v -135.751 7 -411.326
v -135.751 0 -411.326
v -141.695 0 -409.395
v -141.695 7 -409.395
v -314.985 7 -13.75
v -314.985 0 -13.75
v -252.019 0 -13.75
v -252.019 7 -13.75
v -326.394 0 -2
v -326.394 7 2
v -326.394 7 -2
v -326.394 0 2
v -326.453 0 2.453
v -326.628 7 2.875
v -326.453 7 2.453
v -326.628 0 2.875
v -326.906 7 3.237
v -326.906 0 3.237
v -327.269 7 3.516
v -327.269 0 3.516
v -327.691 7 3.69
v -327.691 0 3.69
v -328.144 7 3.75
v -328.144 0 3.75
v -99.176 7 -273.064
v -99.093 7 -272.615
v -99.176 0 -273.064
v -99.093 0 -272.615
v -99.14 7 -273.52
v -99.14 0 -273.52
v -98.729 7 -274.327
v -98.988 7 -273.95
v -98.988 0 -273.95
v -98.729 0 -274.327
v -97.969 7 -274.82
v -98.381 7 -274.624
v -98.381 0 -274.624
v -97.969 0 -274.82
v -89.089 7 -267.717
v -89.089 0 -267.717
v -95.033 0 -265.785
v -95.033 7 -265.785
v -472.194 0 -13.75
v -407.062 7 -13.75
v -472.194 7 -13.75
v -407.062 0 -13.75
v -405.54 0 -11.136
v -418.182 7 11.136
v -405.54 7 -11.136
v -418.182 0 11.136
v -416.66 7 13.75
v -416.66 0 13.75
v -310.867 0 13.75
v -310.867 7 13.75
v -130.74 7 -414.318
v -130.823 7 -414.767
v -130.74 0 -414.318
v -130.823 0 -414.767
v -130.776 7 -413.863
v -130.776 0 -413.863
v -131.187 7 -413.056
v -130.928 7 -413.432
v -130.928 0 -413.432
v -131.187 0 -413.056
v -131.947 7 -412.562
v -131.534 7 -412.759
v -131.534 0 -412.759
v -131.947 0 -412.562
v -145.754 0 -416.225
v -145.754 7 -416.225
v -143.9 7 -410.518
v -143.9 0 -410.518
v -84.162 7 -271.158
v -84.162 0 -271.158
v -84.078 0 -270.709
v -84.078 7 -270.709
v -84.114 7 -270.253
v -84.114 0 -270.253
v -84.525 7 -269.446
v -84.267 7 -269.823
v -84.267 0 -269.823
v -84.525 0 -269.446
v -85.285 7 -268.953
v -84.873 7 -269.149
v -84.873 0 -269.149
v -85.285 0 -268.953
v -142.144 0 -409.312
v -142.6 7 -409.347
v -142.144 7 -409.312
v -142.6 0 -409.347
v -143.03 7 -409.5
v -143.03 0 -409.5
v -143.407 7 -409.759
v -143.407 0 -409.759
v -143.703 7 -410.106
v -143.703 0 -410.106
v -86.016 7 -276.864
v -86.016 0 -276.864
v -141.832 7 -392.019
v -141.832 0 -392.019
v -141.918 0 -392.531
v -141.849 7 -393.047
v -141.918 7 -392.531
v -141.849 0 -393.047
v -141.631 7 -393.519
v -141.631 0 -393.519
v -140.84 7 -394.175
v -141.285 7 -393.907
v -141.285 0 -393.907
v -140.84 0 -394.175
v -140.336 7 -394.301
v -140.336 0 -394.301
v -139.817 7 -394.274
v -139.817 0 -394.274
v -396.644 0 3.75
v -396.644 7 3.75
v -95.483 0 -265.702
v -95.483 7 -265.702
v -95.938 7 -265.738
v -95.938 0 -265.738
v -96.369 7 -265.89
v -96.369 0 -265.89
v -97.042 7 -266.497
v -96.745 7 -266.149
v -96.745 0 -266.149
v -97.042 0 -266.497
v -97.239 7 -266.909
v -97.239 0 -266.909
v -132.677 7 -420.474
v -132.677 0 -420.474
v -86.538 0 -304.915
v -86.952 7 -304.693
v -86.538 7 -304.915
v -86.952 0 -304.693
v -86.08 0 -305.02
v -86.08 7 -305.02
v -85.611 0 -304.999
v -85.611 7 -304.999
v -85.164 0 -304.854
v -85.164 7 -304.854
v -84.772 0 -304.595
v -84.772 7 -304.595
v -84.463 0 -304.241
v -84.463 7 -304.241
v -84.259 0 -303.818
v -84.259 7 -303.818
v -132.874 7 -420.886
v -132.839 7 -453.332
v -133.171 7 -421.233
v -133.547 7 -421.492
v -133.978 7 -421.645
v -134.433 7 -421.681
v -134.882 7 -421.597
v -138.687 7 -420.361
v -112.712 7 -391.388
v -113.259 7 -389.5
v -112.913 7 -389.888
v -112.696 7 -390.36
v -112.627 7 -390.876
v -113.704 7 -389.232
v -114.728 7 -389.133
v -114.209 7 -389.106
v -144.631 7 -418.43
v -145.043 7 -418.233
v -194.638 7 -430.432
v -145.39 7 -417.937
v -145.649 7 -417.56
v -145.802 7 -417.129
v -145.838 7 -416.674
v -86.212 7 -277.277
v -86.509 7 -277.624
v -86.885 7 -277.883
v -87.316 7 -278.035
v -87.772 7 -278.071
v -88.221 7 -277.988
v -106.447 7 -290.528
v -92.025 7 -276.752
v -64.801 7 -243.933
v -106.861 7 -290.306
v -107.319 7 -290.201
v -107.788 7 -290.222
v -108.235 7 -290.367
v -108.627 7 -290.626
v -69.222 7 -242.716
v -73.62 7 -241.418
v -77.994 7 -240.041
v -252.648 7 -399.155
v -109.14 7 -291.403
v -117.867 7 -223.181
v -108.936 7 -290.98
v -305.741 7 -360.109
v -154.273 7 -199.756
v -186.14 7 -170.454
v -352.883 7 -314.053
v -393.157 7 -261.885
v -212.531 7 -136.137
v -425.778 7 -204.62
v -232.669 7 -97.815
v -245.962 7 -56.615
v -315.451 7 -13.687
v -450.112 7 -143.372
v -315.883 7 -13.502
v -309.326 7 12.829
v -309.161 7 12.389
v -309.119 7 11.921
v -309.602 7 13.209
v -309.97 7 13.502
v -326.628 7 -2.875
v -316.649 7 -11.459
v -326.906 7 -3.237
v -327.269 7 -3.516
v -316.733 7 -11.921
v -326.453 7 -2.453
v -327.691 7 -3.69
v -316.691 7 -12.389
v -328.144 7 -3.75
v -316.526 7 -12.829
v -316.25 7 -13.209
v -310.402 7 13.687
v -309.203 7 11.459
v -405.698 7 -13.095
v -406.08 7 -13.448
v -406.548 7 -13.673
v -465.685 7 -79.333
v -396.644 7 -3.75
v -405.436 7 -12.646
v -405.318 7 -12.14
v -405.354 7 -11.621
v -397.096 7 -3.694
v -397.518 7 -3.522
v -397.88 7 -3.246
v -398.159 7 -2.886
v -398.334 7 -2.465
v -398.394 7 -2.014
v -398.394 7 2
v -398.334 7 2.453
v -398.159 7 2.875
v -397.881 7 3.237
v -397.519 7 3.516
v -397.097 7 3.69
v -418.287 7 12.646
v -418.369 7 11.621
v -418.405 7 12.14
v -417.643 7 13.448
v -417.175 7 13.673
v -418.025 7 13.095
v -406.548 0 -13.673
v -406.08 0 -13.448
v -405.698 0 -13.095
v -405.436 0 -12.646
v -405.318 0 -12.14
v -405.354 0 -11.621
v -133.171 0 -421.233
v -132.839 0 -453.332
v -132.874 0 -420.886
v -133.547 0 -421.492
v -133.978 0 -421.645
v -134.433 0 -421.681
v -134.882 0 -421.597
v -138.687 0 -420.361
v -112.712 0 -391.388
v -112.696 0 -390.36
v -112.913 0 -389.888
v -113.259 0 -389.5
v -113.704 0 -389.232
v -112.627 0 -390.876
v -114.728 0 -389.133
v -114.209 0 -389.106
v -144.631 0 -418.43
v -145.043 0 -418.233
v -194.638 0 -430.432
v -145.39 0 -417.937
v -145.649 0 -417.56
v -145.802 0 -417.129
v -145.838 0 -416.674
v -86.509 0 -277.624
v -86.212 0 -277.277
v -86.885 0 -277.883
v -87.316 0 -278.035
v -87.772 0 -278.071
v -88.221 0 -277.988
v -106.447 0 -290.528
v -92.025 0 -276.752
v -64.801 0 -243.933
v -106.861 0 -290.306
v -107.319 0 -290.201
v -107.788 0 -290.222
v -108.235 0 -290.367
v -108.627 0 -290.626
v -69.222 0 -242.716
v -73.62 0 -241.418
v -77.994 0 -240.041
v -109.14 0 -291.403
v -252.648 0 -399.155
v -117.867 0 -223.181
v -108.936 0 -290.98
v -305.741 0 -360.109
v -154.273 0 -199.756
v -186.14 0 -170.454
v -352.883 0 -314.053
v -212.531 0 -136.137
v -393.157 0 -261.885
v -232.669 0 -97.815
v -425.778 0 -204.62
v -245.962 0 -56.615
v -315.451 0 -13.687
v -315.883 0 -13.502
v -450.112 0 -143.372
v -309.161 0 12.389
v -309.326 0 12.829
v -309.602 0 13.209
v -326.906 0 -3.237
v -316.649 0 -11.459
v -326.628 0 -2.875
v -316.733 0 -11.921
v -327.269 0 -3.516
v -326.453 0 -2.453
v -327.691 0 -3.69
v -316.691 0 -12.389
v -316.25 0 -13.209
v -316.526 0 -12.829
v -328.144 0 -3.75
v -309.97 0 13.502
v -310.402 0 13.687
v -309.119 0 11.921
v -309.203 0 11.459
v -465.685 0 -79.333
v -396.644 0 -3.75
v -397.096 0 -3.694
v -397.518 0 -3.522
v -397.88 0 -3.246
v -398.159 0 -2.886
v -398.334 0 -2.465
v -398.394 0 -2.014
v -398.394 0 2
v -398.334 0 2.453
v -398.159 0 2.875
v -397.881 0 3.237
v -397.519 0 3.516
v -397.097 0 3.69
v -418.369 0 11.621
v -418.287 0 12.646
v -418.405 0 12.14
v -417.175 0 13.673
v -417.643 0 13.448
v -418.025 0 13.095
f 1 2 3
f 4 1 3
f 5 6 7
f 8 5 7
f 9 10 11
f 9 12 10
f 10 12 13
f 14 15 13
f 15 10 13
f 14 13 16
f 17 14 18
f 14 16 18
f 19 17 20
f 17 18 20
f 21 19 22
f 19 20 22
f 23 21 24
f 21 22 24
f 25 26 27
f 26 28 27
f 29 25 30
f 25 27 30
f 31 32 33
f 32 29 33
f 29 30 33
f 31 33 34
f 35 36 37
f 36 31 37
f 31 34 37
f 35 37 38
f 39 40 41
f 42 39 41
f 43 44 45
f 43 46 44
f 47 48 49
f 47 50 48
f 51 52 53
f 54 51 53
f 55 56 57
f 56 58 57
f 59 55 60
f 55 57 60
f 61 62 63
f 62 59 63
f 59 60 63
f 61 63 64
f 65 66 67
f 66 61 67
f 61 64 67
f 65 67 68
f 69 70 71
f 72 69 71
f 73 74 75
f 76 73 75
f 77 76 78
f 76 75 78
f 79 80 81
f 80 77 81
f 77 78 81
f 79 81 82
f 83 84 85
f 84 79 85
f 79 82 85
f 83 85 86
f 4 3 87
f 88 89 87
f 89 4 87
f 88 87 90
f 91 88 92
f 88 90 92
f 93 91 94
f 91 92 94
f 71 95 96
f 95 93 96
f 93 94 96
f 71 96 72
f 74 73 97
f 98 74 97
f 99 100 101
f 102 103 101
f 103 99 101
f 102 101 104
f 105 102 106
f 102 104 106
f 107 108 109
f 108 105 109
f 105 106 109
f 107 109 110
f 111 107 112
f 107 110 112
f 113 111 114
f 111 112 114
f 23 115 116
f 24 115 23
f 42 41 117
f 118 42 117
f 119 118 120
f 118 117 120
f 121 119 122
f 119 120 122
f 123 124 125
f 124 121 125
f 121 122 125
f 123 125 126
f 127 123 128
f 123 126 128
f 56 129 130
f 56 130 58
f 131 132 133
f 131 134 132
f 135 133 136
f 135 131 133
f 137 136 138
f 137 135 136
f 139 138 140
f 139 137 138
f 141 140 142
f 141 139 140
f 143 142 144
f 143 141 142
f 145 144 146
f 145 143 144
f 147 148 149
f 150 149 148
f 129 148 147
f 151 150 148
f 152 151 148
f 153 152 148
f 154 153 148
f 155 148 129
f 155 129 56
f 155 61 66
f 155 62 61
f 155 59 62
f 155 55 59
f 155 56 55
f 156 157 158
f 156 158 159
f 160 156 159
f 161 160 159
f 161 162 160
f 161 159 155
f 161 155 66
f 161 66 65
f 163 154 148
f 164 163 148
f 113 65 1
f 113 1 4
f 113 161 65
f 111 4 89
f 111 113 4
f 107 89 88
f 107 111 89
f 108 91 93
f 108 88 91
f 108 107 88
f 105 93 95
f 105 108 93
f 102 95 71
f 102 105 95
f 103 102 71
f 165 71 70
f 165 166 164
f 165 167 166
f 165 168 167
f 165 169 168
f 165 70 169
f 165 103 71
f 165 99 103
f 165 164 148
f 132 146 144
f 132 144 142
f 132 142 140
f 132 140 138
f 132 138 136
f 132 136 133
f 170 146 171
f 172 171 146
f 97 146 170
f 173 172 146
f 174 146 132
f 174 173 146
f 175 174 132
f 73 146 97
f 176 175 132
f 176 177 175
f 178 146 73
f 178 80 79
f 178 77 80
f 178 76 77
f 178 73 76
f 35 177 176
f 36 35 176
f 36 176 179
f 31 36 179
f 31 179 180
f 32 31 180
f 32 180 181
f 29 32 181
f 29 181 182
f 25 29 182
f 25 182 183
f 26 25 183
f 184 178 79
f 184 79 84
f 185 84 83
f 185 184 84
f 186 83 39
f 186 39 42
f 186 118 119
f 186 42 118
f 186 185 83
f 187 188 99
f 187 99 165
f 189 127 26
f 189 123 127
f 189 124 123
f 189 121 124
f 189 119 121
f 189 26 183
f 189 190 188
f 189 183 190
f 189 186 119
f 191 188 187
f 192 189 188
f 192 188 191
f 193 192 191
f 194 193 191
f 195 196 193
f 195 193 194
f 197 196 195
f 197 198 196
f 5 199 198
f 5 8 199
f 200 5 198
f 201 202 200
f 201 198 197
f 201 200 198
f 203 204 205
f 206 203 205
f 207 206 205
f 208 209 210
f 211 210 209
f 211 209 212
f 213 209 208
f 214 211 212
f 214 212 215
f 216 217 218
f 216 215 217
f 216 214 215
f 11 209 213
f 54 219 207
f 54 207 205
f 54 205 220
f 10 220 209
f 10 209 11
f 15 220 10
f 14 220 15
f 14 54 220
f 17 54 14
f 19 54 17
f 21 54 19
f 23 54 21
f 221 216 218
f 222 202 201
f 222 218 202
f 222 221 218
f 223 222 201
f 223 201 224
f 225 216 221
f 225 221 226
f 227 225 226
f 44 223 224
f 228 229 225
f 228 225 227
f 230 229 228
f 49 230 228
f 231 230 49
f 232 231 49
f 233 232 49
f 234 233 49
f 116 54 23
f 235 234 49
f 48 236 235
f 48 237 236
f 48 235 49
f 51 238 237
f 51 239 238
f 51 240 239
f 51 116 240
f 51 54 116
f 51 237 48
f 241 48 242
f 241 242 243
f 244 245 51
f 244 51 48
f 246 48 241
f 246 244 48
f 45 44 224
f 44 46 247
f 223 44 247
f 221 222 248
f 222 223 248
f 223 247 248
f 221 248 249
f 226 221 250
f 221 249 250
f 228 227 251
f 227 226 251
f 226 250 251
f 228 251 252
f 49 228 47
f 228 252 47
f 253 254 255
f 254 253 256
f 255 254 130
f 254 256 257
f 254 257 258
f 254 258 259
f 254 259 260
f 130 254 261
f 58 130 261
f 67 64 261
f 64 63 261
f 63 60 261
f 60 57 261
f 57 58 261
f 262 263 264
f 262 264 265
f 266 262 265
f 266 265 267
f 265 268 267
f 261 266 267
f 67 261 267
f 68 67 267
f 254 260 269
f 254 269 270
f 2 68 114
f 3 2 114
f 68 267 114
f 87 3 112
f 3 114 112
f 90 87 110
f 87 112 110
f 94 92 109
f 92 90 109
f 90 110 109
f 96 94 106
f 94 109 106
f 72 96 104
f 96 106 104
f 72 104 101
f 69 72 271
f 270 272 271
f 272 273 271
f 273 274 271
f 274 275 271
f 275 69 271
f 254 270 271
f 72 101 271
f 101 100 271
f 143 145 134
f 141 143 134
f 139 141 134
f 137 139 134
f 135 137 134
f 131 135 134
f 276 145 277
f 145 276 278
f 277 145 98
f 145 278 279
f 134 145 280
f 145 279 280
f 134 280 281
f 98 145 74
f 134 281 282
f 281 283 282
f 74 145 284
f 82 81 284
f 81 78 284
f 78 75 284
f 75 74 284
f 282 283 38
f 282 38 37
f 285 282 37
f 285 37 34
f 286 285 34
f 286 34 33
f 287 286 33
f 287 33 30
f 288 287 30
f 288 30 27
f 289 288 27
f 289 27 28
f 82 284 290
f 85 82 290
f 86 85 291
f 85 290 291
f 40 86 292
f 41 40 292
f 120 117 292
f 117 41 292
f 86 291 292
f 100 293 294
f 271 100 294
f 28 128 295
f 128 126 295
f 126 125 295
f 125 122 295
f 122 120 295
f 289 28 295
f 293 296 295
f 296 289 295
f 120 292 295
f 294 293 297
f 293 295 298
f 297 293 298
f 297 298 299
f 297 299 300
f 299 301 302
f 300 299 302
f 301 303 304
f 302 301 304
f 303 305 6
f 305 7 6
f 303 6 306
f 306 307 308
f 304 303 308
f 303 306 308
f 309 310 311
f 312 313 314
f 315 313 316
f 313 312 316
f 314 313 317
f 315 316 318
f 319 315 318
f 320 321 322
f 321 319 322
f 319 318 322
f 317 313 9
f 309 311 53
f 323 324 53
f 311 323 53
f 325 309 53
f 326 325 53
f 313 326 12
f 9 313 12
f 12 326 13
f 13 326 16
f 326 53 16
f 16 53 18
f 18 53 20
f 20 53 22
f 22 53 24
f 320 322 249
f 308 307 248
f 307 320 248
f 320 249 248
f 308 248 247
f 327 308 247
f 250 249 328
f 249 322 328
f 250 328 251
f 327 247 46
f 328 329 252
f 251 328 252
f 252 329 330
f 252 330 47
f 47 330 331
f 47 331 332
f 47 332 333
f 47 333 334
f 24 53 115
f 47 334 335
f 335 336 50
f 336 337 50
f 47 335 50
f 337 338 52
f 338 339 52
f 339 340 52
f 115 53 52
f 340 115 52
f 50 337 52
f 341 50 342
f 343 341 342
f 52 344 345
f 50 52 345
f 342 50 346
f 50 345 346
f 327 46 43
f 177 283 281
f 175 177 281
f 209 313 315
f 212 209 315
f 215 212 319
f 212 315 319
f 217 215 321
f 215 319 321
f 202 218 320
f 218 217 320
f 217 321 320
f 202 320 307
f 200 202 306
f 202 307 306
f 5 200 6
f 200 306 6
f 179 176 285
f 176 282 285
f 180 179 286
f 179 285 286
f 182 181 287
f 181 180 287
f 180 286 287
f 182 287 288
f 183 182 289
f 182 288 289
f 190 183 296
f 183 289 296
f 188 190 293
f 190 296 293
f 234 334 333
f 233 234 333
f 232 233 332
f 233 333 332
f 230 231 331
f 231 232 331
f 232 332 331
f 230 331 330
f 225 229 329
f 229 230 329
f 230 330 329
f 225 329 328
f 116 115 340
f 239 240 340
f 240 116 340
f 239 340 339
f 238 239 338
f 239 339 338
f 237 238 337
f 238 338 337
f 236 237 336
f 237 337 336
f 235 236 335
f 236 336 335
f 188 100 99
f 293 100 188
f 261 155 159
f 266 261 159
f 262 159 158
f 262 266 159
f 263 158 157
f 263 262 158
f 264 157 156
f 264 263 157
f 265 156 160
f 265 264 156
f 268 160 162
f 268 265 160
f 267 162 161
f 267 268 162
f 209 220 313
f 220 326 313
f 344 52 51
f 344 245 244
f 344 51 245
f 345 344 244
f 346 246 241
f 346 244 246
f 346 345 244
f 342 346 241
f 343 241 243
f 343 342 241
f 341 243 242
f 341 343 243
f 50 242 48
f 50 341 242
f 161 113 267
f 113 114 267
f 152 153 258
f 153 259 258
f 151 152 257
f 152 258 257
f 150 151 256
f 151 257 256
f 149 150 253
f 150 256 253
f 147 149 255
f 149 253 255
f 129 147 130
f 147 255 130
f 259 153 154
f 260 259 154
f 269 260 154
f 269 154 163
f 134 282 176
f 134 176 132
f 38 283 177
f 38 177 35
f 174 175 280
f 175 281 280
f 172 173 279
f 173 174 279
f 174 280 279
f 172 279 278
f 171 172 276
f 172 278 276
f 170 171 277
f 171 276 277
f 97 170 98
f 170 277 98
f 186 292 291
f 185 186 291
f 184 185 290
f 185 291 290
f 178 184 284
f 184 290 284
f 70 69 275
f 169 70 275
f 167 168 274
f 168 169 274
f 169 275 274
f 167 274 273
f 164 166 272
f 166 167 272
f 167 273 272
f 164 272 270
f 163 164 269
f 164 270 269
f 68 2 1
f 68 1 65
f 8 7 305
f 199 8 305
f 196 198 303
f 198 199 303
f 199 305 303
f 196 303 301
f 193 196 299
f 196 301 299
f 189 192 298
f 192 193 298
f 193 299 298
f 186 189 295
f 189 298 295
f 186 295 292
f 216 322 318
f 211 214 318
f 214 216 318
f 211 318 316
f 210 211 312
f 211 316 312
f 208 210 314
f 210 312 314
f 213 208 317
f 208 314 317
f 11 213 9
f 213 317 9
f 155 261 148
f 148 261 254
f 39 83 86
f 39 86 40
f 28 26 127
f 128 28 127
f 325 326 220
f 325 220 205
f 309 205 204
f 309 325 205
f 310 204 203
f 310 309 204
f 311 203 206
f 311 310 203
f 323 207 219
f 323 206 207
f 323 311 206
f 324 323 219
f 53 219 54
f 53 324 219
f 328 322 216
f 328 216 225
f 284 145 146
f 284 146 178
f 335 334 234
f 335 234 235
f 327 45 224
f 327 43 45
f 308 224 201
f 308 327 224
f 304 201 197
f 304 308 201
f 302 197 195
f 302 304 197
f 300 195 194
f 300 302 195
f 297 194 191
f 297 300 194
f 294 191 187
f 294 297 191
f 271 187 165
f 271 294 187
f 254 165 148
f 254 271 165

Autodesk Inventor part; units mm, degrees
ref_plane "YZ Plane" through (0, 0, 0) normal (1, 0, 0) x (0, 1, 0)
ref_plane "XZ Plane" through (0, 0, 0) normal (0, 1, 0) x (-1, 0, 0)
ref_plane "XY Plane" through (0, 0, 0) normal (0, 0, 1) x (1, 0, 0)
sketch "Sketch1" plane through (0, 0, 0) normal (0, 1, 0) x (-1, 0, 0)
  line L0 (0, 0) -> (618.9442, 0)
  line L1 (0, 0) -> (191.2643, 588.6509)
  line L2 (0, 0) -> (-500.7364, 363.8063)
  line L3 (0, 0) -> (-500.7364, -363.8063)
  line L4 (0, 0) -> (191.2643, -588.6509)
  line L5 (396.6438, 3.75) -> (328.1438, 3.75)
  line L6 (328.1438, -3.75) -> (396.6438, -3.75)
  arc A0 (472.3938, 0) -> (145.9777, 449.2732) centre (0, 0) ccw
  arc A1 (77.994, -240.0408) -> (252.3938, 0) centre (0, 0) ccw
  line L7 (289.8938, 3.75) -> (283.8938, 3.75)
  line L8 (283.8938, -3.75) -> (289.8938, -3.75)
  arc A2 (328.1438, 3.75) -> (326.3938, 2) centre (328.1438, 2) ccw
  arc A3 (326.3938, -2) -> (328.1438, -3.75) centre (328.1438, -2) ccw
  line L9 (326.3938, 2) -> (326.3938, -2)
  arc A4 (398.3938, 2) -> (396.6438, 3.75) centre (396.6438, 2) ccw
  arc A5 (396.6438, -3.75) -> (398.3938, -2.0136) centre (396.6573, -2.0136) ccw
  line L10 (398.3938, -2.0136) -> (398.3938, 2)
  line L11 (362.3938, -3.75) -> (362.3938, 32.9806)
  arc A6 (283.8938, 3.75) -> (282.1438, 2) centre (283.8938, 2) ccw
  arc A7 (282.1438, -2) -> (283.8938, -3.75) centre (283.8938, -2) ccw
  arc A8 (289.8938, -3.75) -> (291.6438, -2) centre (289.8938, -2) ccw
  arc A9 (291.6438, 2) -> (289.8938, 3.75) centre (289.8938, 2) ccw
  line L12 (291.6438, 2) -> (291.6438, -2)
  line L13 (282.1438, -2) -> (282.1438, 2)
  line L14 (434.8938, 3.75) -> (440.8938, 3.75)
  line L15 (440.8938, -3.75) -> (434.8938, -3.75)
  arc A10 (442.6438, 2) -> (440.8938, 3.75) centre (440.8938, 2) ccw
  arc A11 (440.8938, -3.75) -> (442.6438, -2) centre (440.8938, -2) ccw
  arc A12 (433.1438, -2) -> (434.8938, -3.75) centre (434.8938, -2) ccw
  arc A13 (434.8938, 3.75) -> (433.1438, 2) centre (434.8938, 2) ccw
  line L16 (433.1438, 2) -> (433.1438, -2)
  line L17 (442.6438, -2) -> (442.6438, 2)
  line L18 (131.9467, 412.5623) -> (135.7509, 411.3262)
  arc A14 (130.8231, 414.7674) -> (131.9467, 412.5623) centre (132.4875, 414.2266) ccw
  arc A15 (135.7509, 411.3262) -> (137.956, 412.4498) centre (136.2917, 412.9905) ccw
  line L19 (139.8101, 418.1561) -> (137.956, 412.4498)
  line L20 (130.8231, 414.7674) -> (132.6772, 420.4737)
  arc A16 (134.8823, 421.5973) -> (132.6772, 420.4737) centre (134.3416, 419.9329) ccw
  line L21 (138.6866, 420.3612) -> (134.8823, 421.5973)
  arc A17 (139.8101, 418.1561) -> (138.6866, 420.3612) centre (138.1458, 418.6969) ccw
  line L22 (125.0255, 378.2728) -> (121.2083, 379.513)
  arc A18 (121.2083, 379.513) -> (119.0032, 378.3895) centre (120.6676, 377.8487) ccw
  arc A19 (126.1361, 376.0718) -> (125.0255, 378.2728) centre (124.4888, 376.6213) ccw
  line L23 (119.0032, 378.3895) -> (97.8355, 313.2421)
  line L24 (98.9591, 311.037) -> (102.7633, 309.8009)
  arc A20 (97.8355, 313.2421) -> (98.9591, 311.037) centre (99.4999, 312.7013) ccw
  arc A21 (102.7633, 309.8009) -> (104.9685, 310.9245) centre (103.3041, 311.4652) ccw
  line L25 (104.9685, 310.9245) -> (126.1361, 376.0718)
  line L26 (88.2208, 277.9878) -> (92.025, 276.7517)
  arc A22 (93.1486, 274.5466) -> (92.025, 276.7517) centre (91.4842, 275.0873) ccw
  line L27 (91.2945, 268.8402) -> (93.1486, 274.5466)
  arc A23 (88.2208, 277.9878) -> (86.0156, 276.8642) centre (87.68, 276.3234) ccw
  line L28 (86.0156, 276.8642) -> (84.1615, 271.1578)
  arc A24 (84.1615, 271.1578) -> (85.2851, 268.9527) centre (85.8259, 270.6171) ccw
  arc A25 (89.0893, 267.7166) -> (91.2945, 268.8402) centre (89.6301, 269.381) ccw
  line L29 (89.0893, 267.7166) -> (85.2851, 268.9527)
  line L30 (-351.5963, 252.9775) -> (-349.2451, 256.2136)
  arc A26 (-354.0407, 252.5903) -> (-351.5963, 252.9775) centre (-353.012, 254.0061) ccw
  arc A27 (-349.2451, 256.2136) -> (-349.6323, 258.658) centre (-350.6609, 257.2422) ccw
  line L31 (-354.4864, 262.1847) -> (-349.6323, 258.658)
  line L32 (-354.0407, 252.5903) -> (-358.8948, 256.1171)
  arc A28 (-359.2819, 258.5615) -> (-358.8948, 256.1171) centre (-357.8661, 257.5328) ccw
  line L33 (-356.9308, 261.7975) -> (-359.2819, 258.5615)
  arc A29 (-354.4864, 262.1847) -> (-356.9308, 261.7975) centre (-355.515, 260.7689) ccw
  line L34 (-321.1238, 235.799) -> (-323.4829, 232.552)
  arc A30 (-323.4829, 232.552) -> (-323.0958, 230.1076) centre (-322.0671, 231.5233) ccw
  arc A31 (-318.6874, 236.1752) -> (-321.1238, 235.799) centre (-319.7189, 234.7783) ccw
  line L35 (-323.0958, 230.1076) -> (-267.6781, 189.8443)
  line L36 (-265.2337, 190.2314) -> (-262.8825, 193.4675)
  arc A32 (-267.6781, 189.8443) -> (-265.2337, 190.2314) centre (-266.6495, 191.26) ccw
  arc A33 (-262.8825, 193.4675) -> (-263.2697, 195.9119) centre (-264.2983, 194.4961) ccw
  line L37 (-263.2697, 195.9119) -> (-318.6874, 236.1752)
  line L38 (-237.1203, 169.8059) -> (-234.7692, 173.0419)
  arc A34 (-232.3248, 173.4291) -> (-234.7692, 173.0419) centre (-233.3534, 172.0133) ccw
  line L39 (-227.4707, 169.9024) -> (-232.3248, 173.4291)
  arc A35 (-237.1203, 169.8059) -> (-236.7332, 167.3615) centre (-235.7046, 168.7773) ccw
  line L40 (-236.7332, 167.3615) -> (-231.8791, 163.8348)
  arc A36 (-231.8791, 163.8348) -> (-229.4347, 164.2219) centre (-230.8505, 165.2505) ccw
  arc A37 (-227.0835, 167.458) -> (-227.4707, 169.9024) centre (-228.4993, 168.4866) ccw
  line L41 (-227.0835, 167.458) -> (-229.4347, 164.2219)
  line L42 (-349.2451, -256.2136) -> (-351.5963, -252.9775)
  arc A38 (-349.6323, -258.658) -> (-349.2451, -256.2136) centre (-350.6609, -257.2422) ccw
  arc A39 (-351.5963, -252.9775) -> (-354.0407, -252.5903) centre (-353.012, -254.0061) ccw
  line L43 (-358.8948, -256.117) -> (-354.0407, -252.5903)
  line L44 (-349.6323, -258.658) -> (-354.4864, -262.1847)
  arc A40 (-356.9308, -261.7975) -> (-354.4864, -262.1847) centre (-355.515, -260.7689) ccw
  line L45 (-359.2819, -258.5615) -> (-356.9308, -261.7975)
  arc A41 (-358.8948, -256.117) -> (-359.2819, -258.5615) centre (-357.8661, -257.5328) ccw
  line L46 (-323.4909, -232.541) -> (-321.1318, -235.788)
  arc A42 (-321.1318, -235.788) -> (-318.6874, -236.1752) centre (-319.716, -234.7594) ccw
  arc A43 (-323.0958, -230.1076) -> (-323.4909, -232.541) centre (-322.086, -231.5203) ccw
  line L47 (-318.6874, -236.1752) -> (-263.2697, -195.9119)
  line L48 (-262.8825, -193.4675) -> (-265.2337, -190.2314)
  arc A44 (-263.2697, -195.9119) -> (-262.8825, -193.4675) centre (-264.2983, -194.4961) ccw
  arc A45 (-265.2337, -190.2314) -> (-267.6781, -189.8443) centre (-266.6495, -191.26) ccw
  line L49 (-267.6781, -189.8443) -> (-323.0958, -230.1076)
  line L50 (-234.7692, -173.0419) -> (-237.1203, -169.8059)
  arc A46 (-236.7332, -167.3615) -> (-237.1203, -169.8059) centre (-235.7046, -168.7773) ccw
  line L51 (-231.8791, -163.8348) -> (-236.7332, -167.3615)
  arc A47 (-234.7692, -173.0419) -> (-232.3248, -173.4291) centre (-233.3534, -172.0133) ccw
  line L52 (-232.3248, -173.4291) -> (-227.4707, -169.9024)
  arc A48 (-227.4707, -169.9024) -> (-227.0835, -167.458) centre (-228.4993, -168.4866) ccw
  arc A49 (-229.4347, -164.2219) -> (-231.8791, -163.8348) centre (-230.8505, -165.2505) ccw
  line L53 (-229.4347, -164.2219) -> (-227.0835, -167.458)
  line L54 (135.7509, -411.3262) -> (131.9467, -412.5623)
  arc A50 (137.956, -412.4498) -> (135.7509, -411.3262) centre (136.2917, -412.9905) ccw
  arc A51 (131.9467, -412.5623) -> (130.8231, -414.7674) centre (132.4875, -414.2266) ccw
  line L55 (132.6772, -420.4737) -> (130.8231, -414.7674)
  line L56 (137.956, -412.4498) -> (139.8101, -418.1561)
  arc A52 (138.6866, -420.3612) -> (139.8101, -418.1561) centre (138.1458, -418.6969) ccw
  line L57 (134.8823, -421.5973) -> (138.6866, -420.3612)
  arc A53 (132.6772, -420.4737) -> (134.8823, -421.5973) centre (134.3416, -419.9329) ccw
  line L58 (121.1954, -379.5172) -> (125.0126, -378.277)
  arc A54 (125.0126, -378.277) -> (126.1361, -376.0718) centre (124.4718, -376.6126) ccw
  arc A55 (119.0032, -378.3895) -> (121.1954, -379.5172) centre (120.6588, -377.8657) ccw
  line L59 (126.1361, -376.0718) -> (104.9685, -310.9245)
  line L60 (102.7633, -309.8009) -> (98.9591, -311.037)
  arc A56 (104.9685, -310.9245) -> (102.7633, -309.8009) centre (103.3041, -311.4652) ccw
  arc A57 (98.9591, -311.037) -> (97.8355, -313.2421) centre (99.4999, -312.7013) ccw
  line L61 (97.8355, -313.2421) -> (119.0032, -378.3895)
  line L62 (92.025, -276.7517) -> (88.2208, -277.9878)
  arc A58 (86.0156, -276.8642) -> (88.2208, -277.9878) centre (87.68, -276.3234) ccw
  line L63 (84.1615, -271.1578) -> (86.0156, -276.8642)
  arc A59 (92.025, -276.7517) -> (93.1486, -274.5466) centre (91.4842, -275.0873) ccw
  line L64 (93.1486, -274.5466) -> (91.2945, -268.8402)
  arc A60 (91.2945, -268.8402) -> (89.0893, -267.7166) centre (89.6301, -269.381) ccw
  arc A61 (85.2851, -268.9527) -> (84.1615, -271.1578) centre (85.8259, -270.6171) ccw
  line L65 (85.2851, -268.9527) -> (89.0893, -267.7166)
  line L66 (-442.5303, 165.2961) -> (-220.837, 122.2033)
  line L67 (-442.5303, -165.2961) -> (-220.837, -122.2033)
  arc A62 (252.3938, 0) -> (-220.837, 122.2033) centre (0, 0) ccw
  arc A63 (-220.837, -122.2033) -> (77.994, -240.0408) centre (0, 0) ccw
  arc A64 (145.9777, 449.2732) -> (-442.5303, 165.2961) centre (0, 0) ccw
  arc A65 (-442.5303, -165.2961) -> (472.3938, 0) centre (0, 0) ccw
  line L68 (115.6782, 400.5167) -> (82.9862, 299.9012)
  line L69 (84.6505, 297.6104) -> (108.7484, 297.6104)
  line L70 (110.4128, 295.3196) -> (90.9552, 235.4353)
  line L71 (138.8662, 382.8904) -> (158.9929, 444.8338)
  line L72 (118.6344, 401.1564) -> (135.91, 382.2507)
  line L73 (123.1169, 378.8929) -> (127.2722, 391.7035) construction
  line L74 (100.8612, 310.4189) -> (96.6995, 297.6104) construction
  arc A66 (135.91, 382.2507) -> (138.8662, 382.8904) centre (137.2019, 383.4311) ccw
  arc A67 (118.6344, 401.1564) -> (115.6782, 400.5167) centre (117.3425, 399.9759) ccw
  arc A68 (82.9862, 299.9012) -> (84.6505, 297.6104) centre (84.6505, 299.3604) ccw
  arc A69 (110.4128, 295.3196) -> (108.7484, 297.6104) centre (108.7484, 295.8604) ccw
  line L75 (407.0624, -13.75) -> (472.1936, -13.75)
  arc A70 (405.5405, -11.1361) -> (407.0624, -13.75) centre (407.0624, -12) ccw
  line L76 (418.1824, 11.1361) -> (405.5405, -11.1361)
  arc A71 (418.1824, 11.1361) -> (416.6605, 13.75) centre (416.6605, 12) ccw
  line L77 (416.6605, 13.75) -> (310.8671, 13.75)
  line L78 (309.2028, 11.4592) -> (316.6494, -11.4592)
  arc A72 (310.8671, 13.75) -> (309.2028, 11.4592) centre (310.8671, 12) ccw
  arc A73 (314.9851, -13.75) -> (316.6494, -11.4592) centre (314.9851, -12) ccw
  line L79 (314.9851, -13.75) -> (252.019, -13.75)
  line L80 (112.7122, -391.3883) -> (132.8388, -453.3318)
  arc A74 (114.7278, -389.1332) -> (112.7122, -391.3883) centre (114.3765, -390.8476) ccw
  line L81 (139.8166, -394.2739) -> (114.7278, -389.1332)
  arc A75 (139.8166, -394.2739) -> (141.8322, -392.0187) centre (140.1679, -392.5595) ccw
  line L82 (141.8322, -392.0187) -> (109.1403, -291.4032)
  line L83 (106.4473, -290.5282) -> (86.9517, -304.6926)
  arc A76 (109.1403, -291.4032) -> (106.4473, -290.5282) centre (107.4759, -291.944) ccw
  arc A77 (84.2587, -303.8176) -> (86.9517, -304.6926) centre (85.9231, -303.2768) ccw
  line L84 (84.2587, -303.8176) -> (64.8011, -243.9333)
  line L85 (-359.2819, 258.5615) -> (-362.9556, 253.5051)
  line L86 (-362.5684, 251.0607) -> (-357.7143, 247.534)
  line L87 (-351.5963, 252.9775) -> (-355.2699, 247.9211)
  arc A78 (-362.9556, 253.5051) -> (-362.5684, 251.0607) centre (-361.5398, 252.4765) ccw
  arc A79 (-357.7143, 247.534) -> (-355.2699, 247.9211) centre (-356.6857, 248.9498) ccw
  line L88 (-237.1203, 169.8059) -> (-240.794, 164.7495)
  line L89 (-240.4068, 162.3051) -> (-235.5527, 158.7784)
  line L90 (-229.4347, 164.2219) -> (-233.1083, 159.1656)
  arc A80 (-240.794, 164.7495) -> (-240.4068, 162.3051) centre (-239.3782, 163.7209) ccw
  arc A81 (-235.5527, 158.7784) -> (-233.1083, 159.1656) centre (-234.5241, 160.1942) ccw
  line L91 (-356.9308, -261.7975) -> (-353.2571, -266.8539)
  arc A82 (-353.2571, -266.8539) -> (-350.8127, -267.241) centre (-351.8413, -265.8253) ccw
  line L92 (-350.8127, -267.241) -> (-345.9586, -263.7143)
  arc A83 (-345.9586, -263.7143) -> (-345.5715, -261.2699) centre (-346.9872, -262.2985) ccw
  line L93 (-349.2451, -256.2136) -> (-345.5715, -261.2699)
  line L94 (-234.7692, -173.0419) -> (-231.0955, -178.0983)
  arc A84 (-231.0955, -178.0983) -> (-228.6511, -178.4855) centre (-229.6798, -177.0697) ccw
  line L95 (-228.6511, -178.4855) -> (-223.797, -174.9587)
  arc A85 (-223.797, -174.9587) -> (-223.4099, -172.5143) centre (-224.8257, -173.543) ccw
  line L96 (-227.0835, -167.458) -> (-223.4099, -172.5143)
  line L97 (138.6866, -420.3612) -> (144.6307, -418.4299)
  arc A86 (144.6307, -418.4299) -> (145.7542, -416.2247) centre (144.0899, -416.7655) ccw
  line L98 (145.7542, -416.2247) -> (143.9001, -410.5184)
  arc A87 (143.9001, -410.5184) -> (141.695, -409.3948) centre (142.2358, -411.0592) ccw
  line L99 (135.7509, -411.3262) -> (141.695, -409.3948)
  line L100 (92.025, -276.7517) -> (97.9691, -274.8203)
  arc A88 (97.9691, -274.8203) -> (99.0927, -272.6152) centre (97.4283, -273.156) ccw
  line L101 (99.0927, -272.6152) -> (97.2386, -266.9089)
  arc A89 (97.2386, -266.9089) -> (95.0334, -265.7853) centre (95.5742, -267.4496) ccw
  line L102 (89.0893, -267.7166) -> (95.0334, -265.7853)
  line L103 (442.6438, 2) -> (442.6438, 8.25)
  arc A90 (442.6438, 8.25) -> (440.8938, 10) centre (440.8938, 8.25) ccw
  line L104 (440.8938, 10) -> (434.8938, 10)
  arc A91 (434.8938, 10) -> (433.1438, 8.25) centre (434.8938, 8.25) ccw
  line L105 (433.1438, 2) -> (433.1438, 8.25)
  line L106 (291.6438, 2) -> (291.6438, 8.25)
  arc A92 (291.6438, 8.25) -> (289.8938, 10) centre (289.8938, 8.25) ccw
  line L107 (289.8938, 10) -> (283.8938, 10)
  arc A93 (283.8938, 10) -> (282.1438, 8.25) centre (283.8938, 8.25) ccw
  line L108 (282.1438, 2) -> (282.1438, 8.25)
  line L109 (134.8823, 421.5973) -> (128.9382, 423.5286)
  arc A94 (128.9382, 423.5286) -> (126.7331, 422.4051) centre (128.3975, 421.8643) ccw
  line L110 (126.7331, 422.4051) -> (124.879, 416.6987)
  arc A95 (124.879, 416.6987) -> (126.0026, 414.4936) centre (126.5434, 416.158) ccw
  line L111 (131.9467, 412.5623) -> (126.0026, 414.4936)
  line L112 (88.2208, 277.9878) -> (82.2767, 279.9191)
  arc A96 (82.2767, 279.9191) -> (80.0715, 278.7955) centre (81.7359, 278.2548) ccw
  line L113 (80.0715, 278.7955) -> (78.2174, 273.0892)
  arc A97 (78.2174, 273.0892) -> (79.341, 270.8841) centre (79.8818, 272.5484) ccw
  line L114 (85.2851, 268.9527) -> (79.341, 270.8841)
  point P0 (115.5523, 343.4982)
  point P1 (-290.9785, 216.0435)
  point P2 (-295.3869, -209.9759)
  point P3 (108.4194, -345.8158)
  point P4 (137.9375, 380.0319)
  point P5 (97.9406, 311.9068)
  point P6 (104.0986, 309.906)
  point P7 (119.8731, 379.408)
  point P8 (404.0568, -13.75)
  point P9 (411.8615, 0)
  point P10 (312.9261, 0)
  point P11 (111.7834, -388.5299)
  point P12 (127.2722, -391.7035)
  point P13 (96.6995, -297.6104)
  point P14 (282.1438, 2)
  point P15 (442.6438, 2)
  dimension "d4" = 360
  dimension "d6" = 7.5
  dimension "d7" = 7.5
  dimension "d9" = 68.5
  dimension "d10" = 7.5
  dimension "d11" = 7.5
  dimension "d12" = 3.5
  dimension "d13" = 3.5
  dimension "d19" = 360
  dimension "d21" = 25
  dimension "d25" = 10
  dimension "d26" = 10
  dimension "d27" = 1.75
  dimension "d30" = 144
  dimension "d34" = 0
  dimension "d35" = 8
  dimension "d36" = 1.75
  dimension "d43" = 8
  dimension "d44" = 1.75
  dimension "d47" = 360
extrude "Extrusion1" add sketch "Sketch1" along normal blind 7 contours A1 L79 A73 L78 L0 L9 A3 L6 A5 L10 L76 A70 L75 A65 L4 L57 L97 A86 L98 A87 L99 L54 L81 A75 L82 A76 L83 L62 L100 A88 L101 A89 L102 L65 | L4 L65 A61 L63 A58 L62 L83 A77 L84 A63 | L78 A72 L77 L11 L5 A2 L9 L0 | L80 A74 L81 L4 L54 A51 L55 A53 L57 A65 | L10 A4 L5 L11 L77 A71 L76 L0
properties part number "Level 3b - V2"
